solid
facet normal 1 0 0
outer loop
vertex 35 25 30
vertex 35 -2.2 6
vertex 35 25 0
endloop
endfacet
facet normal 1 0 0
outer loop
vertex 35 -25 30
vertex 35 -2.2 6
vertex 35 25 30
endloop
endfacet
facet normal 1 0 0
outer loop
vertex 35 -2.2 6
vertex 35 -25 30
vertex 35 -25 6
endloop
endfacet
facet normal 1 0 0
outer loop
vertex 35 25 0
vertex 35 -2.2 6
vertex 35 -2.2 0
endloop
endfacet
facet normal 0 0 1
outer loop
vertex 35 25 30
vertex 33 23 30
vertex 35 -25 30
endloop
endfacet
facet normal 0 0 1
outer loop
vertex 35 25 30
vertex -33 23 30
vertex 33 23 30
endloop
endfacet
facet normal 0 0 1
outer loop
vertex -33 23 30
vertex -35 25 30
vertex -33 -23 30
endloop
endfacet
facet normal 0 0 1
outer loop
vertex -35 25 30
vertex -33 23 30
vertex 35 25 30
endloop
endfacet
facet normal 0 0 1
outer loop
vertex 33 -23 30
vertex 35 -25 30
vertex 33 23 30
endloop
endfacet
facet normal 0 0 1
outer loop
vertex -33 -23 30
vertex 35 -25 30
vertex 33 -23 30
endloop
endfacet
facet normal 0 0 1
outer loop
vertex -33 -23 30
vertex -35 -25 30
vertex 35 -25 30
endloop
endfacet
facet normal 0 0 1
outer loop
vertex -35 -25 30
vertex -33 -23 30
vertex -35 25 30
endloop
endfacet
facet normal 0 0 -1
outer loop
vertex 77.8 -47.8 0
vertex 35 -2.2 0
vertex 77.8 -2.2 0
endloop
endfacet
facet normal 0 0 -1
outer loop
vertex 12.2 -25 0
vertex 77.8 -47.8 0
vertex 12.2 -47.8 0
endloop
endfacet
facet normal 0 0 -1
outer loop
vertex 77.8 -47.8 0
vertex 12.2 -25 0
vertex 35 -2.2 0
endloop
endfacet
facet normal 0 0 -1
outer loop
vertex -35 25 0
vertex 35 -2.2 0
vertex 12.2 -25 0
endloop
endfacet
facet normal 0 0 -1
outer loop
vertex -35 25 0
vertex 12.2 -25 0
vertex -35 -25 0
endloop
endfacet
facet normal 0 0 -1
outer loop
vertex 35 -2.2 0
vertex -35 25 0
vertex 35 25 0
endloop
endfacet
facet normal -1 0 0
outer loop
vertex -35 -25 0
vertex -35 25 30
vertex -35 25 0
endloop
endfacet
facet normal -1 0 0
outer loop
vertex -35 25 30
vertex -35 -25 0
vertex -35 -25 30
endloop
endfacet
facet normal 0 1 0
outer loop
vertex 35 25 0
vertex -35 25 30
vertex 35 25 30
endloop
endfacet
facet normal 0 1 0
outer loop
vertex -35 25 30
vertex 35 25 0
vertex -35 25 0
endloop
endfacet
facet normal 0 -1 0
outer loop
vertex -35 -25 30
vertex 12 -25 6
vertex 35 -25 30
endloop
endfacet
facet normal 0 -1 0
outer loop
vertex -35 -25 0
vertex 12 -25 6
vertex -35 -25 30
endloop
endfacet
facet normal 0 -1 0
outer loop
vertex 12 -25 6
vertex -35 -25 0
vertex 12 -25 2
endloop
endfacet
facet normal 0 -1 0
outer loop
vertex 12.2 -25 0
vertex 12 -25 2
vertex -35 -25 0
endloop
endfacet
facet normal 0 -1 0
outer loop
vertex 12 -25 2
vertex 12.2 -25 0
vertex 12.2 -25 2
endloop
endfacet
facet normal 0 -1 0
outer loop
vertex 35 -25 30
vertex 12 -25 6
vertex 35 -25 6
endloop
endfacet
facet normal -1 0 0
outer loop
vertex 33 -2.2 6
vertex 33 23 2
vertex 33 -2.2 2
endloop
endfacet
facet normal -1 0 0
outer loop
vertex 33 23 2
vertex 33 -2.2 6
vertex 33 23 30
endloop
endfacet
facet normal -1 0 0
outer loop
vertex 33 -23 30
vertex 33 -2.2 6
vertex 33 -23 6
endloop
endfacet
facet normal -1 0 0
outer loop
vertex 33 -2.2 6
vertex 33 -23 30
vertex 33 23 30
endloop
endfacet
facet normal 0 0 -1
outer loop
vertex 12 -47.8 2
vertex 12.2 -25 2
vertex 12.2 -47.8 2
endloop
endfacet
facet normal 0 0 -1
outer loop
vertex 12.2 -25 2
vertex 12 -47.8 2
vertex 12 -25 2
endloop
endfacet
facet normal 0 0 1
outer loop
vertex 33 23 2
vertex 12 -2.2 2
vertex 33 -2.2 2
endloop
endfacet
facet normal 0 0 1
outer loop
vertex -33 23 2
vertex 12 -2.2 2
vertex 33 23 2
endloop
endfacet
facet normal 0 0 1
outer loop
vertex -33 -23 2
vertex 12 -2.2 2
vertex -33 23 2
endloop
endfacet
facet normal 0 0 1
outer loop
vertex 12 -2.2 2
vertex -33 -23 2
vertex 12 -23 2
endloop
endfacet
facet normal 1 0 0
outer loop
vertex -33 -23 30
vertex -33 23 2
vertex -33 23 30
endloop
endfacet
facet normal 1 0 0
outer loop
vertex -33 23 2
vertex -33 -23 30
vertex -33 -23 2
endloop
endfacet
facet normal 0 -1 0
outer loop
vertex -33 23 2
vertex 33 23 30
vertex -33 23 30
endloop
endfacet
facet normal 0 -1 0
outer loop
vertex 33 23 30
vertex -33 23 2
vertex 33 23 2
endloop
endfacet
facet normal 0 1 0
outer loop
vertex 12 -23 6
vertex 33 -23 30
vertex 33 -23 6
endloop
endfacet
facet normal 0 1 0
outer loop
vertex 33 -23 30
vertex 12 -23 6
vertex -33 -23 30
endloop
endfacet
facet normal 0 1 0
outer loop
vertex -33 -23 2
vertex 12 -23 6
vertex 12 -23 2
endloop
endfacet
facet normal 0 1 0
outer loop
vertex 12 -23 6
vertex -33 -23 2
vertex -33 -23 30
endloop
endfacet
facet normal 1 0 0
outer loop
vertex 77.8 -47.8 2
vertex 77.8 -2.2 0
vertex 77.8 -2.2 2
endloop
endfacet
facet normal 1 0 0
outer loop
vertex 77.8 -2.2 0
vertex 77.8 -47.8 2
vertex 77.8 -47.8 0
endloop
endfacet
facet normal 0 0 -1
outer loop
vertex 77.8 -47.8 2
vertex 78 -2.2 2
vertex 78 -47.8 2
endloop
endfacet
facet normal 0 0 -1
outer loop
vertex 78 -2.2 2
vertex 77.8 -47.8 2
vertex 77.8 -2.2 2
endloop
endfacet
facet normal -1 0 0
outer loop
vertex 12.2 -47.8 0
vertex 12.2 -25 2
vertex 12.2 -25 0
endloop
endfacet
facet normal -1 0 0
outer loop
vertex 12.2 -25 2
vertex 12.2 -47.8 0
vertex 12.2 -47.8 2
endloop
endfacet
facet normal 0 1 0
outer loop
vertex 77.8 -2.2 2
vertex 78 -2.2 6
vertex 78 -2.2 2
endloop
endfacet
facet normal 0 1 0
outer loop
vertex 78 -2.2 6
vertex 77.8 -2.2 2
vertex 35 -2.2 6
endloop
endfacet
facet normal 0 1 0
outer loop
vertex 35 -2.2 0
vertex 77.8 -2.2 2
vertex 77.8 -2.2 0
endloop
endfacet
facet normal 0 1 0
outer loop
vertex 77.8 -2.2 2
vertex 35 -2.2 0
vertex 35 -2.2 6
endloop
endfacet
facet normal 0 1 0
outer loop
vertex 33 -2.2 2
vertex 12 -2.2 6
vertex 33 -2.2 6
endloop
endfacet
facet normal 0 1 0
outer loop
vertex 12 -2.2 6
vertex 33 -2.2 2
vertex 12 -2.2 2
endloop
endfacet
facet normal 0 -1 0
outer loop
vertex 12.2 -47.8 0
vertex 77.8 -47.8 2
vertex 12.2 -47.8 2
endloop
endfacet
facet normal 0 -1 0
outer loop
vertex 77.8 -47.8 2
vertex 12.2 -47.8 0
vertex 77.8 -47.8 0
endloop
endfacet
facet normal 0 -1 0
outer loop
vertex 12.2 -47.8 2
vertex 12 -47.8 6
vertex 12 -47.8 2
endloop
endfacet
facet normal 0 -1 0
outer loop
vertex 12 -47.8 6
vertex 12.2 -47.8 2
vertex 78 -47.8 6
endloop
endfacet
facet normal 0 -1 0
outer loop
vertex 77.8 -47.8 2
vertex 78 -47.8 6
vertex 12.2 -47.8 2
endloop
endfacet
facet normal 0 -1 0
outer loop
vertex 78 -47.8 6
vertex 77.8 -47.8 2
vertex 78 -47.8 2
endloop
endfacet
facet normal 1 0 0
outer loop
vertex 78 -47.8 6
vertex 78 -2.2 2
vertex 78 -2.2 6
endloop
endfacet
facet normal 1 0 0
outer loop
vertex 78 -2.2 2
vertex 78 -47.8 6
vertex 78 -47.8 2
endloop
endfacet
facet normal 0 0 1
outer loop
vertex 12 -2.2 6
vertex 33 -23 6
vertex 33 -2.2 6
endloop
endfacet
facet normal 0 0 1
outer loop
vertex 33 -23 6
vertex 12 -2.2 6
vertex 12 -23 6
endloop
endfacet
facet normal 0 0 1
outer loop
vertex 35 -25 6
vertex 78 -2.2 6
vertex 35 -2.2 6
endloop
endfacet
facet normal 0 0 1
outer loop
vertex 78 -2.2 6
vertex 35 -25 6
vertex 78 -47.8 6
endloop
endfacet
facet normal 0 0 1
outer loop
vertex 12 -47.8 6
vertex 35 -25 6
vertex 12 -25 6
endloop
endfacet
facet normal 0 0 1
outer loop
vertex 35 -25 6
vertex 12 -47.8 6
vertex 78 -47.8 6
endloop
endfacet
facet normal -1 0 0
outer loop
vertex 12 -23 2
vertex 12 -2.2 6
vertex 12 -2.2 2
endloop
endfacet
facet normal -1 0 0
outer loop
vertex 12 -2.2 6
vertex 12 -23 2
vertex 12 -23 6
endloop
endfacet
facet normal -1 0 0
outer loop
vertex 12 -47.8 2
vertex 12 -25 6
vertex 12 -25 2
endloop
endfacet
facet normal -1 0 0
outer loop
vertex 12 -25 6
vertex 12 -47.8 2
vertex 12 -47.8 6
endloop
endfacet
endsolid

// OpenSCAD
// Two-part enclosure for a small electronics board (e.g. Arduino-based logger)
// Print orientation: box stands on the bed (z = 0), lid plate lies flat on the bed.
// The file renders to two separate solid bodies with a 10 mm gap between them.

// ---------------- Parameters ----------------
box_x      = 70;    // box outer size in X (mm)
box_y      = 50;    // box outer size in Y (mm)
box_z      = 30;    // box outer size in Z (mm)
box_wall   = 2;     // box wall thickness (mm)
box_floor  = 2;     // box floor thickness (mm)

lip_x      = 65.6;  // lip outer size in X (mm)
lip_y      = 45.6;  // lip outer size in Y (mm)
lip_t      = 1.5;   // lip wall thickness (mm)
lip_h      = 4;     // lip height above plate (mm)
lip_clear  = 0.2;   // clearance between lip inner wall and box opening (mm)

eps        = 0.5;   // cutter overshoot past faces (mm)
gap        = 10;    // gap between the two parts along X (mm)

$fn = 64;

// ---------------- Derived ----------------
box_inner_x = box_x - 2 * box_wall;   // 66 mm
box_inner_y = box_y - 2 * box_wall;   // 46 mm
box_h       = box_z - box_floor;      // 28 mm (open top)

// Lid plate thickness is not explicitly given; use a reasonable value.
plate_t = 2;

// Check: lip inner size = outer - 2*wall = 63.6 x 43.6
// Box opening   = inner = 66 x 46
// The lip is therefore 2 mm smaller in each direction: 0.2 mm clearance.
pitch_x = lip_x + 2 * lip_clear;       // 66 mm = box_inner_x
pitch_y = lip_y + 2 * lip_clear;       // 46 mm = box_inner_y

// ---------------- Model ----------------
union() {
    // Part 1: Box
    difference() {
        translate([-box_x / 2, -box_y / 2, 0])
            cube([box_x, box_y, box_z]);
        // Open top: cut away everything above the floor
        translate([-box_inner_x / 2, -box_inner_y / 2, box_floor])
            cube([box_inner_x, box_inner_y, box_h + eps]);
    }

    // Part 2: Lid (printed upside down, so the lip points up +Z)
    translate([box_x / 2 + gap, -box_y / 2, 0])
        union() {
            // Base plate
            translate([-lip_x / 2, -lip_y / 2, 0])
                cube([lip_x, lip_y, plate_t]);

            // Rectangular lip: wall thick in X, height in Z, full Y
            translate([-pitch_x / 2, -lip_y / 2, plate_t])
                cube([pitch_x, lip_y, lip_h]);
        }
}
